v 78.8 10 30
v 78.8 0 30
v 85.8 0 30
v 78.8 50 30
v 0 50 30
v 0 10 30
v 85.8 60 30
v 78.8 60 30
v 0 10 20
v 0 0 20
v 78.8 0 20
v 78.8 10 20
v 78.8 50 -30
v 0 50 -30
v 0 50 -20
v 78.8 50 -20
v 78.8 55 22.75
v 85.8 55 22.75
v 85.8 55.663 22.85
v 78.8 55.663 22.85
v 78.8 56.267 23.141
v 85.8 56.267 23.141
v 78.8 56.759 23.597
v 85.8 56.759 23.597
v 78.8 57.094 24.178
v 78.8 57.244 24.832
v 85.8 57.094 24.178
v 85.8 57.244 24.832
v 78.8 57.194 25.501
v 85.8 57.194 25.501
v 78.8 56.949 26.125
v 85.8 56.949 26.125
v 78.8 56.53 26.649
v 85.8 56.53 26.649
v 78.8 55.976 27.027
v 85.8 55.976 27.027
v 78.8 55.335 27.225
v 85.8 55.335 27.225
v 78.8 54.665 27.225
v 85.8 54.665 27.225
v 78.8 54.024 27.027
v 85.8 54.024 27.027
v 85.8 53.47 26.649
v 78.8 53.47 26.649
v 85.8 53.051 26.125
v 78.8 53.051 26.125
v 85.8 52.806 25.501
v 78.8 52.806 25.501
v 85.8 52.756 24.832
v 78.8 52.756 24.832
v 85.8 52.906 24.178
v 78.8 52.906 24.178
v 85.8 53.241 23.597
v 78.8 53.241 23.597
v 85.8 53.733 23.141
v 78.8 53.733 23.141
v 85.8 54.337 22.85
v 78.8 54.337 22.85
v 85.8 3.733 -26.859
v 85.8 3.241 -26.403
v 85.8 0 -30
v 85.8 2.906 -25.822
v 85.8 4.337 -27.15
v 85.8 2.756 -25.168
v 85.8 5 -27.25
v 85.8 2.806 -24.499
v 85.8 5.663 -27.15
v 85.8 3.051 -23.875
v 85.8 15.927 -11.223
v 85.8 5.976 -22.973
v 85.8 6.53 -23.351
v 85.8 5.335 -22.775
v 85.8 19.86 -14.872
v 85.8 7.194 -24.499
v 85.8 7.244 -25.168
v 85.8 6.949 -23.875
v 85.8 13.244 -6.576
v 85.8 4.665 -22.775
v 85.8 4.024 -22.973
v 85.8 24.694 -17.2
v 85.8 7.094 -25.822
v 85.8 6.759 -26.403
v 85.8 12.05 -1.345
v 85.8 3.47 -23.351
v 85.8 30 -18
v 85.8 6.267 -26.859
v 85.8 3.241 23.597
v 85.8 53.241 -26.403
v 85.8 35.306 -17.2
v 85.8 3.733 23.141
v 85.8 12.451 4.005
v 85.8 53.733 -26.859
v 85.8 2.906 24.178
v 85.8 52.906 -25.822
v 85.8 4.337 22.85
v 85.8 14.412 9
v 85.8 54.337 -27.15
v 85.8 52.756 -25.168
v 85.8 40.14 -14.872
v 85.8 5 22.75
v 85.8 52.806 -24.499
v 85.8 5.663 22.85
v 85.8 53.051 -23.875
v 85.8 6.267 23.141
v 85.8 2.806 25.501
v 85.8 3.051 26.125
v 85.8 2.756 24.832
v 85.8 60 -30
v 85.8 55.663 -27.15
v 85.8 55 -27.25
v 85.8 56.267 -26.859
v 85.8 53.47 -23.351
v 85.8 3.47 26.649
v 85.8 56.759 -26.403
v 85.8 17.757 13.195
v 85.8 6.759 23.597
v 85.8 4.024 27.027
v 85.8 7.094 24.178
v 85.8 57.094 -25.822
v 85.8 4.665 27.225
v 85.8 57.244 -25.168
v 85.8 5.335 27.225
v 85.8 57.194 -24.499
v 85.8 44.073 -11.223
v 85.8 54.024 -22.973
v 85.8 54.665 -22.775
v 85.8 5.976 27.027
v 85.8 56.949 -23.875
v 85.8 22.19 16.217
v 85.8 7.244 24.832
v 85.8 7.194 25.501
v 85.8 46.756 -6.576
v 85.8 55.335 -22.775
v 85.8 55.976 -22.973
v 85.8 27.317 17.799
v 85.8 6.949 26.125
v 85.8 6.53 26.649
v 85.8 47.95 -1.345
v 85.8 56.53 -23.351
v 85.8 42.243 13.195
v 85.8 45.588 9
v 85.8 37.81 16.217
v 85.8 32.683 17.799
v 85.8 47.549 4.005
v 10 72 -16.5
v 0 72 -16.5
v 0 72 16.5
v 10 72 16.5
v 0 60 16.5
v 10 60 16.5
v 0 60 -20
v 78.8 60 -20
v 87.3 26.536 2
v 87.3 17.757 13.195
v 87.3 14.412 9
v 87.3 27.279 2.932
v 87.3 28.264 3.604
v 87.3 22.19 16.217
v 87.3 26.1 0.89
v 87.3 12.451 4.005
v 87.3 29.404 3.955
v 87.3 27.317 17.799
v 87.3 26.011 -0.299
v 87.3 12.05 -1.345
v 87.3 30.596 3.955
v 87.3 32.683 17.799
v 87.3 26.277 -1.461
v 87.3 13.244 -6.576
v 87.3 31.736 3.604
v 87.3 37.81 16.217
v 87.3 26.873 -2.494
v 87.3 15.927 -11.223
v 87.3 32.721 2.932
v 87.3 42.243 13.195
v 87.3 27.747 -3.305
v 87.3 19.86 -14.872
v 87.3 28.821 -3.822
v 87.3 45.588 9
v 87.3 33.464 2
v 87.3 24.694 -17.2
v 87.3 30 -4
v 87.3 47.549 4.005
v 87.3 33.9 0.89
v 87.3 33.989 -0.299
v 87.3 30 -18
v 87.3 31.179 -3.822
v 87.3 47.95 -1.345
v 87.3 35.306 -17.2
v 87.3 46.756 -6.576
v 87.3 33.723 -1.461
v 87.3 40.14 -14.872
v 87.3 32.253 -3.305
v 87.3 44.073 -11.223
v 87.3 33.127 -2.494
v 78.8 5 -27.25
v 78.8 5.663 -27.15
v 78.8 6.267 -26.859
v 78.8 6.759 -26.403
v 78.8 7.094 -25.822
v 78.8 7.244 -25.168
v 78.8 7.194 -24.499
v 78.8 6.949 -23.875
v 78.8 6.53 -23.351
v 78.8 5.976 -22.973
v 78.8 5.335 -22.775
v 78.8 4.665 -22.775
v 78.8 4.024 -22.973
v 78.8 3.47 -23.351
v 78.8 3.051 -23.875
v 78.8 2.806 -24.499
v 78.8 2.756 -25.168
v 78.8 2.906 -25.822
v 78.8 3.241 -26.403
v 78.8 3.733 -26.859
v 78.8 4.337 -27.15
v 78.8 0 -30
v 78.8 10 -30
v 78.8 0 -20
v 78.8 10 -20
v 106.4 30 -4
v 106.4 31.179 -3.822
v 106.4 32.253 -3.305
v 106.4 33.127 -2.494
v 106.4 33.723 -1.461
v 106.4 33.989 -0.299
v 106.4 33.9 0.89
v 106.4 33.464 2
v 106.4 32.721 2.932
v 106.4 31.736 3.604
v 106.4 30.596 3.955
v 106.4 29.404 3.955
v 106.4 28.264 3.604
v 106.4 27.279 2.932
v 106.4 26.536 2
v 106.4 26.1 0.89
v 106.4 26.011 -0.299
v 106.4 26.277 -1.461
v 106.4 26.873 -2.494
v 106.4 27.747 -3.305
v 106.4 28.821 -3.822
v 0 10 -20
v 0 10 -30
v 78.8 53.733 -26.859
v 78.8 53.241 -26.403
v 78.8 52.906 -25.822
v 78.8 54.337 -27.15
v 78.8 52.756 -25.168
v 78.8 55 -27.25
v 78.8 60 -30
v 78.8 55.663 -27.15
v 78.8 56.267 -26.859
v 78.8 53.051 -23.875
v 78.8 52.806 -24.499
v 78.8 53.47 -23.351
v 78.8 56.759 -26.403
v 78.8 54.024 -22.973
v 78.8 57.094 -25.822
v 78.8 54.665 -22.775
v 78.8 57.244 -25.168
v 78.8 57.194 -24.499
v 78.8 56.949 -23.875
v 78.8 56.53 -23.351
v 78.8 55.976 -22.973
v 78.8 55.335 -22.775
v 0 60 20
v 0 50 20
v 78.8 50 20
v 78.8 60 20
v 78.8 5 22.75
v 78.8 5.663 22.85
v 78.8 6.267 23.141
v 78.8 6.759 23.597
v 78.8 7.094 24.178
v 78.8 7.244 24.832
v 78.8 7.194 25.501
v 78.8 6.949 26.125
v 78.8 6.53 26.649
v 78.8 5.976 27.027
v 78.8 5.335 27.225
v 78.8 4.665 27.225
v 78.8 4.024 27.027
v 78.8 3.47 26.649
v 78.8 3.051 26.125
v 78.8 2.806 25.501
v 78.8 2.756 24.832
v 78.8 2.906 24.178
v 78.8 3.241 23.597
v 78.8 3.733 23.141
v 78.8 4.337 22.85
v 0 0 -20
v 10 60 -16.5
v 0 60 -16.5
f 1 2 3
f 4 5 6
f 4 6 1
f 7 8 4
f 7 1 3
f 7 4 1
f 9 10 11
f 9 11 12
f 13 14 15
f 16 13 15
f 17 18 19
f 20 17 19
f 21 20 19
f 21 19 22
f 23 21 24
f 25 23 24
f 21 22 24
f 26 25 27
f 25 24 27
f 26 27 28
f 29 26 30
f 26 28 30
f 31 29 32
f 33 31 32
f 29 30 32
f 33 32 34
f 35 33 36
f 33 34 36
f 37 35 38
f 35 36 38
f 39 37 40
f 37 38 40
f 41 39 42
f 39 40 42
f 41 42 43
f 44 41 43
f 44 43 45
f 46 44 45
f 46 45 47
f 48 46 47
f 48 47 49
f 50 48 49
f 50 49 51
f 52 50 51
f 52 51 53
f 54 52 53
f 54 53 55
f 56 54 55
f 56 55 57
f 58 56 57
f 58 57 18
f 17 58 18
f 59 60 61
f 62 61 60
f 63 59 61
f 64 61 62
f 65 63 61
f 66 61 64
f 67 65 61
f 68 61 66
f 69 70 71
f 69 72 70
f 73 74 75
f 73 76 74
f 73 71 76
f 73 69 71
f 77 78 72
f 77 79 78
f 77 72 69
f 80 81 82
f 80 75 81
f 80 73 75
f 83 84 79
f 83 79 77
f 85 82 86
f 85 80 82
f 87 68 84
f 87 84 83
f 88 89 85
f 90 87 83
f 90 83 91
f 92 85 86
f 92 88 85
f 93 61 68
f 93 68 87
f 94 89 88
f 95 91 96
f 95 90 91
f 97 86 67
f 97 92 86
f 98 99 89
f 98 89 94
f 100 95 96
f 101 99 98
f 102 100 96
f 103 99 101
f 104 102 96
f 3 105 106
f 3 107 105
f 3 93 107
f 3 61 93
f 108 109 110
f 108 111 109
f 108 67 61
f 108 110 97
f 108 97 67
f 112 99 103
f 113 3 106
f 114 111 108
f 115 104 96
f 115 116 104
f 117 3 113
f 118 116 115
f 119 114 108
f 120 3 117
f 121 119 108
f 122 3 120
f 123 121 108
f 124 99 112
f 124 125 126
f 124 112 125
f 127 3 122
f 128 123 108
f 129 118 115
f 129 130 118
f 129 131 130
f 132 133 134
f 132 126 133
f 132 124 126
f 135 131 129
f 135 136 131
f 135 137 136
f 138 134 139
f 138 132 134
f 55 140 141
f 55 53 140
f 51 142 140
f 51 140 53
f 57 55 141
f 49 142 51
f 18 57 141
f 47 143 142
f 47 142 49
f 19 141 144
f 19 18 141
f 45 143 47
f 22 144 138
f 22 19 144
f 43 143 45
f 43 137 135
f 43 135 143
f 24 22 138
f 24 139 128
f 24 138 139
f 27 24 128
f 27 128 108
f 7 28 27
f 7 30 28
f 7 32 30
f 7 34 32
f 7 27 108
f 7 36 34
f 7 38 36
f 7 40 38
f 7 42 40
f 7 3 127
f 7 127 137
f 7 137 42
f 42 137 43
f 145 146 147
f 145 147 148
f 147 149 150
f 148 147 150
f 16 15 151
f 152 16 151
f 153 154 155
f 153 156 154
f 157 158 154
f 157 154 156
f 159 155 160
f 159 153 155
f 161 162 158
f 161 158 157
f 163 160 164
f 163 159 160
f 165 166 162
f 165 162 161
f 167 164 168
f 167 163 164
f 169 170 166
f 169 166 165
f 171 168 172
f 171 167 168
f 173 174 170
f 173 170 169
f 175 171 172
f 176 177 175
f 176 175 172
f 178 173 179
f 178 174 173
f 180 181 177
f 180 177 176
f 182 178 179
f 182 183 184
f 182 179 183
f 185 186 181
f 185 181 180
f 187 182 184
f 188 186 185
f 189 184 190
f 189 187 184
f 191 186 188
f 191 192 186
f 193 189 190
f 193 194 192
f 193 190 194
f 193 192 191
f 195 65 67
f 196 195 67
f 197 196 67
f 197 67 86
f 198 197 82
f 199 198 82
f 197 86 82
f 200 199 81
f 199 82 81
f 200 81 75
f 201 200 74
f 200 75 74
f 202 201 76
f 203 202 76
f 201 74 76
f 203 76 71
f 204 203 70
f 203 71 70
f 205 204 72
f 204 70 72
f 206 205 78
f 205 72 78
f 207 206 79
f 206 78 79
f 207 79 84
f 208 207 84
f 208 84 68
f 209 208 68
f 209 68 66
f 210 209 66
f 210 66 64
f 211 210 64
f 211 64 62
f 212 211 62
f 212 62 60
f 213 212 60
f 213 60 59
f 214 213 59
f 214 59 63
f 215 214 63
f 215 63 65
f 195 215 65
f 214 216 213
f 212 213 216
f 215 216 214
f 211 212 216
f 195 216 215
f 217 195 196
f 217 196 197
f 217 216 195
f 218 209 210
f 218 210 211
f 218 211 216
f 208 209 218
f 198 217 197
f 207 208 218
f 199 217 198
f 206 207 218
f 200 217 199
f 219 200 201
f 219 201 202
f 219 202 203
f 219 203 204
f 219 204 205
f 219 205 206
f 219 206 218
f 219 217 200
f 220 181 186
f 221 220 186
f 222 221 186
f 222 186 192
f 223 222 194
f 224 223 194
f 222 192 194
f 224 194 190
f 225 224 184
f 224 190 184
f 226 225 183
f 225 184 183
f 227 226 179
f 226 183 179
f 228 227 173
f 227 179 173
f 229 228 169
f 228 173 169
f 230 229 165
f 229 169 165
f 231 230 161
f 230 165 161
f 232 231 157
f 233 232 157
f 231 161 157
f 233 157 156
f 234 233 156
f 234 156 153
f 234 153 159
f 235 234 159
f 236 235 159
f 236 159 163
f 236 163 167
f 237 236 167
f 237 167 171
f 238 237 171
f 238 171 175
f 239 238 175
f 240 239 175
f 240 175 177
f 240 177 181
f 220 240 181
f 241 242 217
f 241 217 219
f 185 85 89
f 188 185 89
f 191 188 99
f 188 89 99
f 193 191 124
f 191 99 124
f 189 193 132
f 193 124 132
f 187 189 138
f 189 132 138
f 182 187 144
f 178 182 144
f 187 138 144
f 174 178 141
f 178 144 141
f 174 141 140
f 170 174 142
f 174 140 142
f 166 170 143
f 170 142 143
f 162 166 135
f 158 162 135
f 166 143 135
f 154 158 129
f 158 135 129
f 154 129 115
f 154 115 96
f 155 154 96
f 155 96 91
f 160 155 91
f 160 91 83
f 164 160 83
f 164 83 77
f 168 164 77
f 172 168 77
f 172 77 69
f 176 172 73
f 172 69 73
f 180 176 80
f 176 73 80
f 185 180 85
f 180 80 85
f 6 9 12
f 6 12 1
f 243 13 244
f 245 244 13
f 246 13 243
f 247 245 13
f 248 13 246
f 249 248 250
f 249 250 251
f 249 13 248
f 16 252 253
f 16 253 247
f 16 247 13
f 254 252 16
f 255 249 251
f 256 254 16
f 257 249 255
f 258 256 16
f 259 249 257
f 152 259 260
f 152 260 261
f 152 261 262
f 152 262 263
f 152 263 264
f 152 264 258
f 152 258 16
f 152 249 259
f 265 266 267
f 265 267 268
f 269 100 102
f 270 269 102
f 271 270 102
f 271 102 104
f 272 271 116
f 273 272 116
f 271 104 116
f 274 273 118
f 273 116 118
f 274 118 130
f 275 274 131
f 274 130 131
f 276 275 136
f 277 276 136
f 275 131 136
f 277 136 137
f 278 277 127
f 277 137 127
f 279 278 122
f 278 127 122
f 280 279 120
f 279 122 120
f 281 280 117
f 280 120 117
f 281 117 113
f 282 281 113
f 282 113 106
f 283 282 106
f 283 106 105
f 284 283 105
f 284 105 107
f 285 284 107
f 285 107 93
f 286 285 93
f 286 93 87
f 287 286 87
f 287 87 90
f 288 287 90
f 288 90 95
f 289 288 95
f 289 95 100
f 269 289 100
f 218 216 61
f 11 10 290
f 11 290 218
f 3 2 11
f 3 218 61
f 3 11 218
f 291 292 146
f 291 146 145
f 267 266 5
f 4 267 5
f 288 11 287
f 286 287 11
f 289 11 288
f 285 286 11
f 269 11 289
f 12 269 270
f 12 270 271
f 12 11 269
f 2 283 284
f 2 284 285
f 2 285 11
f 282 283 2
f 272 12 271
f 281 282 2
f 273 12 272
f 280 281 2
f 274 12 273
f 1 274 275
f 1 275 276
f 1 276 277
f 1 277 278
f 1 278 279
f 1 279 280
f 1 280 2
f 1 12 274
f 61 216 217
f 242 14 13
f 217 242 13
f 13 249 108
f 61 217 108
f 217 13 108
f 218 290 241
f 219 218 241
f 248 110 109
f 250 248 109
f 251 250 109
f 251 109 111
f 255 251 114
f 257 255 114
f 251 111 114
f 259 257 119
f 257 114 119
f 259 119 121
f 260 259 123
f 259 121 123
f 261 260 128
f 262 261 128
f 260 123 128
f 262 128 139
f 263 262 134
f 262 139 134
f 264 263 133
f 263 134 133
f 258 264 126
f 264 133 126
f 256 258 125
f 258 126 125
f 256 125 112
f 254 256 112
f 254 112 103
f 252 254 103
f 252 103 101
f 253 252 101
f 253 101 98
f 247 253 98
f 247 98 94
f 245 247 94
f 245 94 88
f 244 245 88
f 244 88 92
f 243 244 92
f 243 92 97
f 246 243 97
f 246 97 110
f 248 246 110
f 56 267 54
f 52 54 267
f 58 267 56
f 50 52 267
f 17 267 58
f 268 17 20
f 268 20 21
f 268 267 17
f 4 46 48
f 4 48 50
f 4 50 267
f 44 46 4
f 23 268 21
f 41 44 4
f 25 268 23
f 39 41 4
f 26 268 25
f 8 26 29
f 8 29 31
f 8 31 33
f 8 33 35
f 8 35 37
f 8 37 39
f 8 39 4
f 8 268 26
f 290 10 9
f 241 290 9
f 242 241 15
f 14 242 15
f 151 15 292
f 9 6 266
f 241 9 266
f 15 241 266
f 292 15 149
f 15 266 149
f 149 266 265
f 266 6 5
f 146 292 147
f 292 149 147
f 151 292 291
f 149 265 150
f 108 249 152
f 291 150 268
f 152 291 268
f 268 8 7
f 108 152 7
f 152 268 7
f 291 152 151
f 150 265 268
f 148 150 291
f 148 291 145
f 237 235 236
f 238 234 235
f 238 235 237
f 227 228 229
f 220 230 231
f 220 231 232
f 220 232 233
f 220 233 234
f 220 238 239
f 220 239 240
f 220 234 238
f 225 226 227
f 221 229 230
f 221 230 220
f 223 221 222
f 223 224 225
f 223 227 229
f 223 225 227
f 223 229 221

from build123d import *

# Parameters (mm, degrees)
SKETCH1_W          = 85.8
SKETCH1_H          = 60
EXTRUDE1_DEPTH     = 30
SKETCH1_5_W        = 10
SKETCH1_5_H        = 12
EXTRUDE2_DEPTH     = 16.5
SKETCH2_R          = 18
SKETCH2_R_2        = 4
EXTRUDE3_DEPTH     = 1.5
SKETCH2_2_R        = 18
SKETCH2_2_R_2      = 4
EXTRUDE4_DEPTH     = 1.5
SKETCH4_R          = 4
EXTRUDE5_DEPTH     = 20.6
SKETCH5_R          = 2.25
CUT_EXTRUDE1_DEPTH = 86
SKETCH6_W          = 10
SKETCH6_H          = 10
CUT_EXTRUDE2_DEPTH = 78.8


with BuildPart() as part:
    # Sketch1 → Extrude1 (new body, symmetric)
    with BuildSketch(Plane.XY):
        with Locations((42.9, 30)):
            Rectangle(SKETCH1_W, SKETCH1_H)
    extrude(amount=EXTRUDE1_DEPTH, both=True)

    # Sketch1<5> → Extrude2 (add, symmetric)
    with BuildSketch(Plane.XY):
        with Locations((5, 66)):
            Rectangle(SKETCH1_5_W, SKETCH1_5_H)
    extrude(amount=EXTRUDE2_DEPTH, both=True)

    # Sketch2 → Extrude3 (add)
    with BuildSketch(Plane(origin=(85.8, 0, 0), x_dir=(0, 0, -1), z_dir=(1, 0, 0))):
        with Locations((0, 30)):
            Circle(SKETCH2_R)
        with Locations((0, 30)):
            Circle(SKETCH2_R_2, mode=Mode.SUBTRACT)
    extrude(amount=EXTRUDE3_DEPTH)

    # Sketch2<2> → Extrude4 (add)
    with BuildSketch(Plane(origin=(85.8, 0, 0), x_dir=(0, 0, -1), z_dir=(1, 0, 0))):
        with Locations((0, 30)):
            Circle(SKETCH2_2_R)
        with Locations((0, 30)):
            Circle(SKETCH2_2_R_2, mode=Mode.SUBTRACT)
    extrude(amount=EXTRUDE4_DEPTH)

    # Sketch4 → Extrude5 (add)
    with BuildSketch(Plane(origin=(85.8, 0, 0), x_dir=(0, 0, -1), z_dir=(1, 0, 0))):
        with Locations((0, 30)):
            Circle(SKETCH4_R)
    extrude(amount=EXTRUDE5_DEPTH)

    # Sketch5 → Cut-Extrude1 (cut)
    with BuildSketch(Plane(origin=(85.8, 0, 0), x_dir=(0, 0, -1), z_dir=(1, 0, 0))):
        with Locations((-25, 55)):
            Circle(SKETCH5_R)
        with Locations((25, 55)):
            Circle(SKETCH5_R)
        with Locations((25, 5)):
            Circle(SKETCH5_R)
        with Locations((-25, 5)):
            Circle(SKETCH5_R)
    extrude(amount=-CUT_EXTRUDE1_DEPTH, mode=Mode.SUBTRACT)

    # Sketch6 → Cut-Extrude2 (cut)
    with BuildSketch(Plane.ZY):
        with Locations((-25, 55)):
            Rectangle(SKETCH6_W, SKETCH6_H)
        with Locations((25, 55)):
            Rectangle(SKETCH6_W, SKETCH6_H)
        with Locations((-25, 5)):
            Rectangle(SKETCH6_W, SKETCH6_H)
        with Locations((25, 5)):
            Rectangle(SKETCH6_W, SKETCH6_H)
    extrude(amount=-CUT_EXTRUDE2_DEPTH, mode=Mode.SUBTRACT)


solid = part.part
